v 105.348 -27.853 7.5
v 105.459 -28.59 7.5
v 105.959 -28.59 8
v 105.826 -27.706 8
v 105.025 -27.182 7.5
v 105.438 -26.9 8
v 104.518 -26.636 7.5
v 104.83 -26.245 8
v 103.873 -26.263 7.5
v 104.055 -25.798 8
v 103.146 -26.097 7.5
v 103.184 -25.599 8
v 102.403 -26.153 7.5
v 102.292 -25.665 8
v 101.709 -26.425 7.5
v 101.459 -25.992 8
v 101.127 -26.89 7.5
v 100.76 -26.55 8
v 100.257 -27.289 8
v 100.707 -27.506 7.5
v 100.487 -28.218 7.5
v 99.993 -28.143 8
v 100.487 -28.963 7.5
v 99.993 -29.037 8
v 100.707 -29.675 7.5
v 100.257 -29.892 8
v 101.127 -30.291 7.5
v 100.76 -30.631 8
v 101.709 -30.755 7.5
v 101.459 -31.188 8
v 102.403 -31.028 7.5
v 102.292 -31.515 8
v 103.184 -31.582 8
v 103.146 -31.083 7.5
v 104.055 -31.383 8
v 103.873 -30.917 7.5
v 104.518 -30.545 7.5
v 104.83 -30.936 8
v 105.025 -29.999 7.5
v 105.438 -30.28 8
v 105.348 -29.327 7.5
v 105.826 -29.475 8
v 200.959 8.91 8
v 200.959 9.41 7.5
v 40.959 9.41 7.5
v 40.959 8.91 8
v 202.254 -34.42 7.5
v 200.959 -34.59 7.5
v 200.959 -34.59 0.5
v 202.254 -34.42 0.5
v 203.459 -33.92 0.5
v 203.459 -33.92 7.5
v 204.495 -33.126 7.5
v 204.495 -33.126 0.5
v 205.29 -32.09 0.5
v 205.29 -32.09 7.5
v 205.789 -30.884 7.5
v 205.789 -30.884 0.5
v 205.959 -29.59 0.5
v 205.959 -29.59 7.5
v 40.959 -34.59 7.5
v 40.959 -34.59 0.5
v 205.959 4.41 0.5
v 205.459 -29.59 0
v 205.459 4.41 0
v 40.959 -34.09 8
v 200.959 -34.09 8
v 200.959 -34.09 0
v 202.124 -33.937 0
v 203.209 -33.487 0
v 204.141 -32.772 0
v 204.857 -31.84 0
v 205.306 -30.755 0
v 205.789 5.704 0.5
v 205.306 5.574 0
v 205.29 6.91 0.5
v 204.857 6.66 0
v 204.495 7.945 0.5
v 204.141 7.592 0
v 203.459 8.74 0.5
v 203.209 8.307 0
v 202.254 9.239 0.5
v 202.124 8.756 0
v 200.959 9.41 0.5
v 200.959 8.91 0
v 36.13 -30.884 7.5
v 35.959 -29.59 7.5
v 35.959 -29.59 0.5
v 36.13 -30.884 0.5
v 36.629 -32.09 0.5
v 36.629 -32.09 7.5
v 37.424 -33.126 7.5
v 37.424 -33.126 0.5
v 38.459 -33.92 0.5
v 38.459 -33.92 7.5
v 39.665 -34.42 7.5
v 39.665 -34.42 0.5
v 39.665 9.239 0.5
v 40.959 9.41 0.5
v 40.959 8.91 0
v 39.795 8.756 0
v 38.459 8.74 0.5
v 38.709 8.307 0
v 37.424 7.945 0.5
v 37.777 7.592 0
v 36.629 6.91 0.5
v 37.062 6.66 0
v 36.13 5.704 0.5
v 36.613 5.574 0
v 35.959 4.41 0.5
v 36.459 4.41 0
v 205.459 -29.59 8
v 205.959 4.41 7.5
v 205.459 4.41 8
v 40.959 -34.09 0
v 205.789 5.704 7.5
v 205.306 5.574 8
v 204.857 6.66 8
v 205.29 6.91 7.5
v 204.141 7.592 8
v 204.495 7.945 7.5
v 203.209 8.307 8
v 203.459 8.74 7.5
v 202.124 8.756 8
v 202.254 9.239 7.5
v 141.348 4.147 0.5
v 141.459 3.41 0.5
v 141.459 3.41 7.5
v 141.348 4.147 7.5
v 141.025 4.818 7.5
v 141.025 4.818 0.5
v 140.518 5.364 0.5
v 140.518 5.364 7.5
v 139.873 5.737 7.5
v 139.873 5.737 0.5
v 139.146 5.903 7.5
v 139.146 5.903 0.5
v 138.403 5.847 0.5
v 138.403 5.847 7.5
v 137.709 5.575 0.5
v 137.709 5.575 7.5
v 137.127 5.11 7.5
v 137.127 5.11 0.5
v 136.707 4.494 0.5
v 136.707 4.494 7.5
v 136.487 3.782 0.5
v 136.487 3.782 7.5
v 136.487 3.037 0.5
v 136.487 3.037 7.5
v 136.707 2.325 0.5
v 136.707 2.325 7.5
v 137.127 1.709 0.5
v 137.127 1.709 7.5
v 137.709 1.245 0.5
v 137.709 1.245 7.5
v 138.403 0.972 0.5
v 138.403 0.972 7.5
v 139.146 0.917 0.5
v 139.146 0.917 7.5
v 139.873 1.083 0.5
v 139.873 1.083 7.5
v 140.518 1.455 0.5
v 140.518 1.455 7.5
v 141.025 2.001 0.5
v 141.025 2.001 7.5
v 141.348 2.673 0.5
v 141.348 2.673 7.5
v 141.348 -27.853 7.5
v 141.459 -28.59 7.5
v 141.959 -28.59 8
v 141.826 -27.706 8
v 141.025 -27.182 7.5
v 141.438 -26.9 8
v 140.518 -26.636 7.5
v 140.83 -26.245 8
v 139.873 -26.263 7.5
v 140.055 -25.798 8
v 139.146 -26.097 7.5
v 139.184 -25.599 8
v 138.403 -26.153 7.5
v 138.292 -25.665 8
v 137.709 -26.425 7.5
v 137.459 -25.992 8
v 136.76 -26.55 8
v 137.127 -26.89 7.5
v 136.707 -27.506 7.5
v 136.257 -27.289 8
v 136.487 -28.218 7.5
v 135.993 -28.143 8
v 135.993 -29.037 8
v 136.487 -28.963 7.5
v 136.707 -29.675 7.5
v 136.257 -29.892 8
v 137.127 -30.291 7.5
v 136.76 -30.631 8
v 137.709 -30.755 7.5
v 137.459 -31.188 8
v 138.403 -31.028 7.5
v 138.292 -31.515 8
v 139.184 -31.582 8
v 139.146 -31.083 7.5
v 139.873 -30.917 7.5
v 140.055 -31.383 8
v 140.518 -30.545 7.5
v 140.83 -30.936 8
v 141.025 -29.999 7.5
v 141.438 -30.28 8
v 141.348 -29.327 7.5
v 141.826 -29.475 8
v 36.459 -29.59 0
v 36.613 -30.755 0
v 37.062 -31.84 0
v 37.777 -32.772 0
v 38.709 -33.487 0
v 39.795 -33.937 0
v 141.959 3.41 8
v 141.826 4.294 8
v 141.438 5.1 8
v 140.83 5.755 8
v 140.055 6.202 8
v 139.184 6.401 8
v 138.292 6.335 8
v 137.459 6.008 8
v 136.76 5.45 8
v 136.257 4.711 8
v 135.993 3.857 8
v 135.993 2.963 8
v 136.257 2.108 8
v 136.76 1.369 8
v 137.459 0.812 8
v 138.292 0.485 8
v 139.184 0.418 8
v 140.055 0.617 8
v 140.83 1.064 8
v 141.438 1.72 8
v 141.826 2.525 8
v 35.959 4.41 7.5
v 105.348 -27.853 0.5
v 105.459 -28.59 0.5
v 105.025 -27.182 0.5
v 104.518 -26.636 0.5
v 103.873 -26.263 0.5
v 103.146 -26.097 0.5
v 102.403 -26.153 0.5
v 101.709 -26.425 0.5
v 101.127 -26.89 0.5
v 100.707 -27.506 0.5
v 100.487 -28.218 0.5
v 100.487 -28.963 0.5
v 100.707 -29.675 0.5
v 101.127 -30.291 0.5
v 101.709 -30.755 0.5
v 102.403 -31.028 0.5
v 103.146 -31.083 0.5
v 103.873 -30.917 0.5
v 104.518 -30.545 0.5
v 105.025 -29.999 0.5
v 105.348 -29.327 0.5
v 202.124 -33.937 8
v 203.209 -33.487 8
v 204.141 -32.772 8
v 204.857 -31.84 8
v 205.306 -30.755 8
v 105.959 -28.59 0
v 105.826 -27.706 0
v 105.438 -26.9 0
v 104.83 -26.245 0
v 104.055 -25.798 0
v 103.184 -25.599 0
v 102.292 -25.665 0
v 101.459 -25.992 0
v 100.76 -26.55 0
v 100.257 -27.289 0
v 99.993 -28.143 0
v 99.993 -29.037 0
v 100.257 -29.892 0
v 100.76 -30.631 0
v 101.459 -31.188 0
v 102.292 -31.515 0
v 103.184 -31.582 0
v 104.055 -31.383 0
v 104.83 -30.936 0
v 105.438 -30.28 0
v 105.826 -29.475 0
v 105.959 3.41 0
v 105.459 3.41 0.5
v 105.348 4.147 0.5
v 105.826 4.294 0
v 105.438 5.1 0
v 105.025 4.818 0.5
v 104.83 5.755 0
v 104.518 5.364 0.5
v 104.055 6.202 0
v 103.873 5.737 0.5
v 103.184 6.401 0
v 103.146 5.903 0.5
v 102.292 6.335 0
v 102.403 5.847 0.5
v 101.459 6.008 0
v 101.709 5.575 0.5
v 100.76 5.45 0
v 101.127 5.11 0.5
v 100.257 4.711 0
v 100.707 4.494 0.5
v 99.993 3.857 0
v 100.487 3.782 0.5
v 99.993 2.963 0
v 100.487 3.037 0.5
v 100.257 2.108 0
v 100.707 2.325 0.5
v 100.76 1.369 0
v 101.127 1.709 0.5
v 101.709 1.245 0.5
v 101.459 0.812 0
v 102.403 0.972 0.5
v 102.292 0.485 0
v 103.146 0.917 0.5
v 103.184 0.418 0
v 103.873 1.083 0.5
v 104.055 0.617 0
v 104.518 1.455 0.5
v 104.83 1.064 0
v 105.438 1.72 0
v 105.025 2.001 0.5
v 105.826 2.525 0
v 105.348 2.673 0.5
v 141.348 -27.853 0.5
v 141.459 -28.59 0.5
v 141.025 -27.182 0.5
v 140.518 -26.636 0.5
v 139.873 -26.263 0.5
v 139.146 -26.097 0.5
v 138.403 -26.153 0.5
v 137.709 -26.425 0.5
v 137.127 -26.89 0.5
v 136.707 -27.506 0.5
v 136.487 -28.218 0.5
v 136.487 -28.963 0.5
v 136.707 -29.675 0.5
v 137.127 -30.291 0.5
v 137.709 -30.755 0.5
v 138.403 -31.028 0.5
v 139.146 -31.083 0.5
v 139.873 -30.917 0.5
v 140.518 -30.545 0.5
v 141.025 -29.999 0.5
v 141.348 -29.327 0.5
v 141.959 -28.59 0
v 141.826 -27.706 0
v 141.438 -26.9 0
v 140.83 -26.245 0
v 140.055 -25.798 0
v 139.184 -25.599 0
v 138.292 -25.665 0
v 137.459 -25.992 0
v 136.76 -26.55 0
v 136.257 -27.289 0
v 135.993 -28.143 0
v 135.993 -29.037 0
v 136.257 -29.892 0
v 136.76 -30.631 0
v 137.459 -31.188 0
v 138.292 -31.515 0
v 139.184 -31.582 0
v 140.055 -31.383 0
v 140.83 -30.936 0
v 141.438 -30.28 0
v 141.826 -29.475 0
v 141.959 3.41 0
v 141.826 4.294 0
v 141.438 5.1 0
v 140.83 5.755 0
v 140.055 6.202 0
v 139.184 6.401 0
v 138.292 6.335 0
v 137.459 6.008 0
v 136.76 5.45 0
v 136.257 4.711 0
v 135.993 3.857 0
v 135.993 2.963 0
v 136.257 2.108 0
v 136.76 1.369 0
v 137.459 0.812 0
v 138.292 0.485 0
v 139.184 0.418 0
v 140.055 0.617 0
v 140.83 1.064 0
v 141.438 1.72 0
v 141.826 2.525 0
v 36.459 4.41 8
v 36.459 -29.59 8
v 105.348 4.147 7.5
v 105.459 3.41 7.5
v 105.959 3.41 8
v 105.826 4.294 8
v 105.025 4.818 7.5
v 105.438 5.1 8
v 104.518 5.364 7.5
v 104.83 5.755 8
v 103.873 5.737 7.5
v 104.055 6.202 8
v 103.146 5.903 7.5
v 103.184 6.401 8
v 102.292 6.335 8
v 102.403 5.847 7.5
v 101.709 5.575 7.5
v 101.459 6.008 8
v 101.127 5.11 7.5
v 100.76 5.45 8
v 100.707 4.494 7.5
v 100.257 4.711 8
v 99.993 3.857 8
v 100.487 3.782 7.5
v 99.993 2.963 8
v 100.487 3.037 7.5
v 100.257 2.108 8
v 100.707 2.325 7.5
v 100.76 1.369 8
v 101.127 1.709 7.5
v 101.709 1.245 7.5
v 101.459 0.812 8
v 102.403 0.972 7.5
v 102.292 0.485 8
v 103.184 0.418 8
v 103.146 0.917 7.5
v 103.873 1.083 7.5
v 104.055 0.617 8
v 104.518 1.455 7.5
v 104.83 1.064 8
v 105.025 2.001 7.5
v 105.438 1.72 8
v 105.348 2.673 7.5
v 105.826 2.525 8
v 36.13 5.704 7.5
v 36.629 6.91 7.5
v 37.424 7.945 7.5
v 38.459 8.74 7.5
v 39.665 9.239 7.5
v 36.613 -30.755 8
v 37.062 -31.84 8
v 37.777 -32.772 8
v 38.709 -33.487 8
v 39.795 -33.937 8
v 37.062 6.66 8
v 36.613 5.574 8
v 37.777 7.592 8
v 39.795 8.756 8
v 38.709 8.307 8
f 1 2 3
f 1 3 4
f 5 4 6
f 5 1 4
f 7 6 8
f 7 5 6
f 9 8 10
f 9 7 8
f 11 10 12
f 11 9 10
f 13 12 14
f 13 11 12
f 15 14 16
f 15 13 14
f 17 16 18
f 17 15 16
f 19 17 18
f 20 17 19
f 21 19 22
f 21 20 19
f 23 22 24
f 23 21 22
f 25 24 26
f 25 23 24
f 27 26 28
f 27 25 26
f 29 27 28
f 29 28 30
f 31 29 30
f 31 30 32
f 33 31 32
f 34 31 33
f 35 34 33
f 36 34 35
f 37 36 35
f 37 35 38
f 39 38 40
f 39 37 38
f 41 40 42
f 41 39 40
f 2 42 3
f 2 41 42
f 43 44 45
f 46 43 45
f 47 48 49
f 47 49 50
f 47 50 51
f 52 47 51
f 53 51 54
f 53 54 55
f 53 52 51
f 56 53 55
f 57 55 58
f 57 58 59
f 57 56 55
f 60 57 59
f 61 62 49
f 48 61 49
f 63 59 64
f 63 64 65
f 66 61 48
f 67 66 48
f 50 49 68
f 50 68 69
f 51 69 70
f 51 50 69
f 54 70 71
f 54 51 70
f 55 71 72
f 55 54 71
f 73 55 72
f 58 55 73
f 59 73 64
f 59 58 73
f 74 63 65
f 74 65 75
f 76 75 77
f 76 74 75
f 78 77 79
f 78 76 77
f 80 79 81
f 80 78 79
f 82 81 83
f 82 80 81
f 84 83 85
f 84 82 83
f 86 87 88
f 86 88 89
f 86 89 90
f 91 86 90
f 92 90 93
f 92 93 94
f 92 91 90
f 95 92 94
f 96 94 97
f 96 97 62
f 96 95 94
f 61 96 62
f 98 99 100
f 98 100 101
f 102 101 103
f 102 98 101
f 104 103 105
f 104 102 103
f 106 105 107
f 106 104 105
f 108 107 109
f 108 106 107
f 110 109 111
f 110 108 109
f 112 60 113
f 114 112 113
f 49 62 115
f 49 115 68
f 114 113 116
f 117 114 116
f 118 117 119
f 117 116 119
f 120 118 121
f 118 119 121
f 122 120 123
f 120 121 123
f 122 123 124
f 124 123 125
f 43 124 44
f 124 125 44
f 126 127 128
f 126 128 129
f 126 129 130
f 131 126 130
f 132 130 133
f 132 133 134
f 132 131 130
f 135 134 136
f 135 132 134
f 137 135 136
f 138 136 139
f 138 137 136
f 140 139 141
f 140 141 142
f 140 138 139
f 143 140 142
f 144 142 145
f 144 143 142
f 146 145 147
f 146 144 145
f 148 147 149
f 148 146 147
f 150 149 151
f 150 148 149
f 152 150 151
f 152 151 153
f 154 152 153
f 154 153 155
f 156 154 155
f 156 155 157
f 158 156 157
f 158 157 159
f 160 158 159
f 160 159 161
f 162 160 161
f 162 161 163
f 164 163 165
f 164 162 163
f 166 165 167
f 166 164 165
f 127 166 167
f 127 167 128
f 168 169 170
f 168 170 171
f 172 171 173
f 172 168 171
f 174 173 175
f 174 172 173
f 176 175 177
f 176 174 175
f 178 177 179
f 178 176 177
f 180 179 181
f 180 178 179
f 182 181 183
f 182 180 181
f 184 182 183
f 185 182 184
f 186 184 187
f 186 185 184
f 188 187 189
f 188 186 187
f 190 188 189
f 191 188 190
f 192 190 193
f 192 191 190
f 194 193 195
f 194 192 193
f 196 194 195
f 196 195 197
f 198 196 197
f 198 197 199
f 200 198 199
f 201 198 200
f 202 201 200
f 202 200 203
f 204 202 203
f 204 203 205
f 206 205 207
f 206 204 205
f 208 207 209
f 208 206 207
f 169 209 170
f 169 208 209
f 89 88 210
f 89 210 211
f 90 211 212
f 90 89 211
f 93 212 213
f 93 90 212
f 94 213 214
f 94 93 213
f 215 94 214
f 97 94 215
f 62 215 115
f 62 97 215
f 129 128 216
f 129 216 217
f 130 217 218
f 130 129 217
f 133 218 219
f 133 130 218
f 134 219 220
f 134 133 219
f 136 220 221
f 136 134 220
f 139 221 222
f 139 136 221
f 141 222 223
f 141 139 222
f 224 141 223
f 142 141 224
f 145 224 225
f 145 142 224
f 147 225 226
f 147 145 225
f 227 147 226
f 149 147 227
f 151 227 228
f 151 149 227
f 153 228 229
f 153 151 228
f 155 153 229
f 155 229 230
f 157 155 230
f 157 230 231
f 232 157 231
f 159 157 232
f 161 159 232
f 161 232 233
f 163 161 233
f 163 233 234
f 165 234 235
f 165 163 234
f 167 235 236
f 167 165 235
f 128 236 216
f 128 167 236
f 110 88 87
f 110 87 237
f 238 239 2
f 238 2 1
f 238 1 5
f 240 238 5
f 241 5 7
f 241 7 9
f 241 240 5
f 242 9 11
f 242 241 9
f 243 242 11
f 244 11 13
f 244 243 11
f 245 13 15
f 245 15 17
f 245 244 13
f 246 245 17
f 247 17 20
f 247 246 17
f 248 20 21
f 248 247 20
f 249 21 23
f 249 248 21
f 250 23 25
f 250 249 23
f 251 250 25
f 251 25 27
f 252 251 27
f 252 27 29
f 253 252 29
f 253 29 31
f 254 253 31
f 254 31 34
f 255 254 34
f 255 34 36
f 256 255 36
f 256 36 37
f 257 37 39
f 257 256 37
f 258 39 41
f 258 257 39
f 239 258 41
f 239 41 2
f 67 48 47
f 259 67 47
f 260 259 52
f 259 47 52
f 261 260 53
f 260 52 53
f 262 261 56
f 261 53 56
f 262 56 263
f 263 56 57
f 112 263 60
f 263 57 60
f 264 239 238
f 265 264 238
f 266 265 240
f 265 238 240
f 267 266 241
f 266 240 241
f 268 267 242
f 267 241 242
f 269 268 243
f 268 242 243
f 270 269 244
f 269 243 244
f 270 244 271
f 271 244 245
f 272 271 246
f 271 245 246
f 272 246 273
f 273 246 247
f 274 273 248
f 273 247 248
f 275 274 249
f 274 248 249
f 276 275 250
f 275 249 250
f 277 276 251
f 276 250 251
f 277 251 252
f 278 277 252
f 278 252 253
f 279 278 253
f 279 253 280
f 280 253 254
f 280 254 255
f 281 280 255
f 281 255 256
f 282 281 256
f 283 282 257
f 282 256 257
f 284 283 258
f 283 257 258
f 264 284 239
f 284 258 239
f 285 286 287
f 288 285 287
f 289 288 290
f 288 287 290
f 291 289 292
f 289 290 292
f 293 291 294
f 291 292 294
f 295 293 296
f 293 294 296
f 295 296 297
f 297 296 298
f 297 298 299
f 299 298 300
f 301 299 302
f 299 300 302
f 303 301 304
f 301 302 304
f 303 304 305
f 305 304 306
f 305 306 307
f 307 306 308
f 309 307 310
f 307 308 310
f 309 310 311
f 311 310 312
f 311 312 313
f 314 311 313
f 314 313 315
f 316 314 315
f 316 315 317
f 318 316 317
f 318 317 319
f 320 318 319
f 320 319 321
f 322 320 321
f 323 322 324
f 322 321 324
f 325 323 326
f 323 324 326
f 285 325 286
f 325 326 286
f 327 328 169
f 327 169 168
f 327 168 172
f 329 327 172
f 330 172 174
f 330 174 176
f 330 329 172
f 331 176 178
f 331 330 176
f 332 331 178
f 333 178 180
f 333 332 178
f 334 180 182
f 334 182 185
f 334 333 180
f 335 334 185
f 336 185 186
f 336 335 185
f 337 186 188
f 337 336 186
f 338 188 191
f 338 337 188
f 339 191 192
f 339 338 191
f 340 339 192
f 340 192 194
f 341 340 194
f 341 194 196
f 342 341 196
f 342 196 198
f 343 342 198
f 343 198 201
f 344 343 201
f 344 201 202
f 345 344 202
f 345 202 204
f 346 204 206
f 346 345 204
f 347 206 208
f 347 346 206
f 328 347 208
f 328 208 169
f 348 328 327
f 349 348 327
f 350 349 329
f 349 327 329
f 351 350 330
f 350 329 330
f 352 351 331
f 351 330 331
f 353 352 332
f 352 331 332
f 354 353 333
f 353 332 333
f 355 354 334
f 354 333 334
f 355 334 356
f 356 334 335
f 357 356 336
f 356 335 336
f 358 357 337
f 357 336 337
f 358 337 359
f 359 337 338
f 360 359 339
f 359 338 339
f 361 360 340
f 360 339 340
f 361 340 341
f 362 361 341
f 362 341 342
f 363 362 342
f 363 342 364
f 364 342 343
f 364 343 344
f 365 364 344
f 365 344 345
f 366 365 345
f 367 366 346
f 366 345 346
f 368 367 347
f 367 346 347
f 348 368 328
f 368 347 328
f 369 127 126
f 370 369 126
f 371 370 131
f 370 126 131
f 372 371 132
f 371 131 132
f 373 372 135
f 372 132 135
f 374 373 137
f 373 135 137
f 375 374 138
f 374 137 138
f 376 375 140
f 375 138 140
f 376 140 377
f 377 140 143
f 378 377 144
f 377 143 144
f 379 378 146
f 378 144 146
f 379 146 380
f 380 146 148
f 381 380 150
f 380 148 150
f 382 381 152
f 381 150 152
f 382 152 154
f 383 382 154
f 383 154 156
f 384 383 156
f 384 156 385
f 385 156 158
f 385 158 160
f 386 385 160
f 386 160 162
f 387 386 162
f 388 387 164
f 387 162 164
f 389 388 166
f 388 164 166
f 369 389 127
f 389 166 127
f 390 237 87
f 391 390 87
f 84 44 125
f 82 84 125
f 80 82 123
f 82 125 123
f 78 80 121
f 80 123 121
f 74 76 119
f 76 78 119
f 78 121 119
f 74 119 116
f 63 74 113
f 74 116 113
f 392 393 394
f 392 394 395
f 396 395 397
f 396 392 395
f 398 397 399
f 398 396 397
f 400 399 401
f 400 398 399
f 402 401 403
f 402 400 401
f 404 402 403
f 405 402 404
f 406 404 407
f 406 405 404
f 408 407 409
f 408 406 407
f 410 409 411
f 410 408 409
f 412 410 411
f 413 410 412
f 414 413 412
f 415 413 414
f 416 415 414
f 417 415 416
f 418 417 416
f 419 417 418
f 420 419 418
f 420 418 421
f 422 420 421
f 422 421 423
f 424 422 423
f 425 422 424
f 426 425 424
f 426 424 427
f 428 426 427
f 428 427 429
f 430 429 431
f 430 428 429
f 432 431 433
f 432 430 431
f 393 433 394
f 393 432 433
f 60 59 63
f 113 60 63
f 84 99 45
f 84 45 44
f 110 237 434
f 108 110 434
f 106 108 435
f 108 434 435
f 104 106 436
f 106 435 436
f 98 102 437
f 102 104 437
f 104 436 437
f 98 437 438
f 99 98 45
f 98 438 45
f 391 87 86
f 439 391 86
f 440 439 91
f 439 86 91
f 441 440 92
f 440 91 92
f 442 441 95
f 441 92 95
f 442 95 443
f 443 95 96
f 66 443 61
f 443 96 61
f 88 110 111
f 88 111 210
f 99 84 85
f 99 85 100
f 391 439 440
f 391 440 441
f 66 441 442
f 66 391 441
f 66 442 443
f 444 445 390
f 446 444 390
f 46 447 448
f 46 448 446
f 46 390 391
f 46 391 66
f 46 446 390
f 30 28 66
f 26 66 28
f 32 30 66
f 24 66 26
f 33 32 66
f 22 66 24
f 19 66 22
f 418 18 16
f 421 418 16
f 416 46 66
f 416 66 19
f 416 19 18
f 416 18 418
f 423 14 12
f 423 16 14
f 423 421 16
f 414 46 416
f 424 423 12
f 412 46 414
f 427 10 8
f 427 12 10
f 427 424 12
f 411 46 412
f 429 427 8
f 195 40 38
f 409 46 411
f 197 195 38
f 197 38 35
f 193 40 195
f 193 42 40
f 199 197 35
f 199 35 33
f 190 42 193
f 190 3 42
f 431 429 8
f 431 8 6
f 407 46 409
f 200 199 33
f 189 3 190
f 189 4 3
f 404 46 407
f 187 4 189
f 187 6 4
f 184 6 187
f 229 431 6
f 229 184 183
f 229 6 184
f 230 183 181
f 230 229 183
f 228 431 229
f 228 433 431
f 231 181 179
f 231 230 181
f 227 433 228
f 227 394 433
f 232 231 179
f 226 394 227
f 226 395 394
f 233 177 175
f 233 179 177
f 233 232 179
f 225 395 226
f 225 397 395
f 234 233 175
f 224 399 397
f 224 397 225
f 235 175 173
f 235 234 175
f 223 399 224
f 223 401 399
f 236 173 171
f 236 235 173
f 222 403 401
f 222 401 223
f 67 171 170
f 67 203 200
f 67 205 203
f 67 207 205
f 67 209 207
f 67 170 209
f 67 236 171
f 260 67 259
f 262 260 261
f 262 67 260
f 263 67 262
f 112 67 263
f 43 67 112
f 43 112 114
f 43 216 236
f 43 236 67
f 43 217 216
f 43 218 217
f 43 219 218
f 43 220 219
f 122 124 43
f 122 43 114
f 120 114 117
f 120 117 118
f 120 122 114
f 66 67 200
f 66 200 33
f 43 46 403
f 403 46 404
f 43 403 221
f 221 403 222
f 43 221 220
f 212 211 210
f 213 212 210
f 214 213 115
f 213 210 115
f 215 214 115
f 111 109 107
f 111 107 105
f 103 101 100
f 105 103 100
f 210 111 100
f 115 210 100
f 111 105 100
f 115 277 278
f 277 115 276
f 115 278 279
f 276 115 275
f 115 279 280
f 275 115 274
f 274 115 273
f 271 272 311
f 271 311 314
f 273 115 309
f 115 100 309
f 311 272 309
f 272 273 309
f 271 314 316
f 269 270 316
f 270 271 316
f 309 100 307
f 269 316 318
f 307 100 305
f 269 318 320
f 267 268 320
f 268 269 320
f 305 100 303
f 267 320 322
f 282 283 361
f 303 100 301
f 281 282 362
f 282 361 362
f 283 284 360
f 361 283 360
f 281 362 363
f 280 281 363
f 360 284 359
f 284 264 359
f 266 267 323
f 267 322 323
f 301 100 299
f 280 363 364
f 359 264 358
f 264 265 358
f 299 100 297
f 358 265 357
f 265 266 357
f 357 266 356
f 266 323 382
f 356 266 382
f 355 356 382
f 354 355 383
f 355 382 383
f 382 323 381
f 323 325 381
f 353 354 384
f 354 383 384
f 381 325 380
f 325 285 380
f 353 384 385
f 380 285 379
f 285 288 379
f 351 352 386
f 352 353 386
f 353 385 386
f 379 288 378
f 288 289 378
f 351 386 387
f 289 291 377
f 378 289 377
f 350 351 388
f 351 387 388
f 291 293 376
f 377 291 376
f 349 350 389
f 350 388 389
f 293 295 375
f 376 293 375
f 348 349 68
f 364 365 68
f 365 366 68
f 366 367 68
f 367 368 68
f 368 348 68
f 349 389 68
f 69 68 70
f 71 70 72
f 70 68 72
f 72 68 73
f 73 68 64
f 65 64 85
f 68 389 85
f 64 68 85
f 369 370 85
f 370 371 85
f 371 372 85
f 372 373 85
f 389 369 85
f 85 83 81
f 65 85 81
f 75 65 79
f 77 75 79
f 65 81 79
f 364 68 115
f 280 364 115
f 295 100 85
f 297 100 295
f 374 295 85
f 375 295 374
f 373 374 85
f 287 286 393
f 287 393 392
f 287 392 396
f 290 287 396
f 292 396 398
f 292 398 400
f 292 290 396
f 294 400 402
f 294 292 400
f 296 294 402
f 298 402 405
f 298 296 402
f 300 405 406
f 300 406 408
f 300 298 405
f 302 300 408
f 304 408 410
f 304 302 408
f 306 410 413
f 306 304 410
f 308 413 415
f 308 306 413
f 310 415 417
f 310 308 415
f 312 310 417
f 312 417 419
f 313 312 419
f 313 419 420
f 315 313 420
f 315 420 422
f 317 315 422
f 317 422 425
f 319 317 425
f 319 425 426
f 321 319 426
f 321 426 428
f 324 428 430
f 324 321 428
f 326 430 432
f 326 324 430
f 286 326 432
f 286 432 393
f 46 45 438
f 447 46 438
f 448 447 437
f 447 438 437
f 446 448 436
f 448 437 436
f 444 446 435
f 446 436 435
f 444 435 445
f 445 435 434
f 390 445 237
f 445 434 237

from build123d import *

# Parameters (mm, degrees)
F0_W     = 170
F0_H     = 44
F0_R     = 2.5
F1_DEPTH = 8
F2_R     = 5
F3_SIZE  = 0.5


with BuildPart() as f1:
    # F0 (on Top) → F1 (new body)
    with BuildSketch(Plane.XY):
        with Locations((120.9594160169, -12.5902459205)):
            Rectangle(F0_W, F0_H)
        with Locations((102.9594160169, -28.5902459205)):
            Circle(F0_R, mode=Mode.SUBTRACT)
        with Locations((138.9594160169, -28.5902459205)):
            Circle(F0_R, mode=Mode.SUBTRACT)
        with Locations((102.9594160169, 3.4097540795)):
            Circle(F0_R, mode=Mode.SUBTRACT)
        with Locations((138.9594160169, 3.4097540795)):
            Circle(F0_R, mode=Mode.SUBTRACT)
    extrude(amount=F1_DEPTH)

    # F2
    f2_edges = [f1.edges().sort_by_distance(p)[0] for p in [
        (35.959416, -34.590246, 4),
        (205.959416, -34.590246, 4),
        (205.959416, 9.409754, 4),
        (35.959416, 9.409754, 4),
    ]]
    fillet(f2_edges, radius=F2_R)

    # F3
    f3_edges = [f1.edges().sort_by_distance(p)[0] for p in [
        (120.959416, -34.590246, 8),
        (120.959416, -34.590246, 0),
        (136.459416, -28.590246, 8),
        (204.49495, -33.12578, 8),
        (205.959416, -12.590246, 8),
        (204.49495, 7.945288, 8),
        (120.959416, 9.409754, 8),
        (37.423882, 7.945288, 8),
        (35.959416, -12.590246, 8),
        (37.423882, -33.12578, 8),
        (100.459416, -28.590246, 8),
        (100.459416, 3.409754, 8),
        (136.459416, 3.409754, 8),
        (136.459416, -28.590246, 0),
        (136.459416, 3.409754, 0),
        (100.459416, 3.409754, 0),
        (100.459416, -28.590246, 0),
    ]]
    chamfer(f3_edges, length=F3_SIZE)


solid = f1.part
